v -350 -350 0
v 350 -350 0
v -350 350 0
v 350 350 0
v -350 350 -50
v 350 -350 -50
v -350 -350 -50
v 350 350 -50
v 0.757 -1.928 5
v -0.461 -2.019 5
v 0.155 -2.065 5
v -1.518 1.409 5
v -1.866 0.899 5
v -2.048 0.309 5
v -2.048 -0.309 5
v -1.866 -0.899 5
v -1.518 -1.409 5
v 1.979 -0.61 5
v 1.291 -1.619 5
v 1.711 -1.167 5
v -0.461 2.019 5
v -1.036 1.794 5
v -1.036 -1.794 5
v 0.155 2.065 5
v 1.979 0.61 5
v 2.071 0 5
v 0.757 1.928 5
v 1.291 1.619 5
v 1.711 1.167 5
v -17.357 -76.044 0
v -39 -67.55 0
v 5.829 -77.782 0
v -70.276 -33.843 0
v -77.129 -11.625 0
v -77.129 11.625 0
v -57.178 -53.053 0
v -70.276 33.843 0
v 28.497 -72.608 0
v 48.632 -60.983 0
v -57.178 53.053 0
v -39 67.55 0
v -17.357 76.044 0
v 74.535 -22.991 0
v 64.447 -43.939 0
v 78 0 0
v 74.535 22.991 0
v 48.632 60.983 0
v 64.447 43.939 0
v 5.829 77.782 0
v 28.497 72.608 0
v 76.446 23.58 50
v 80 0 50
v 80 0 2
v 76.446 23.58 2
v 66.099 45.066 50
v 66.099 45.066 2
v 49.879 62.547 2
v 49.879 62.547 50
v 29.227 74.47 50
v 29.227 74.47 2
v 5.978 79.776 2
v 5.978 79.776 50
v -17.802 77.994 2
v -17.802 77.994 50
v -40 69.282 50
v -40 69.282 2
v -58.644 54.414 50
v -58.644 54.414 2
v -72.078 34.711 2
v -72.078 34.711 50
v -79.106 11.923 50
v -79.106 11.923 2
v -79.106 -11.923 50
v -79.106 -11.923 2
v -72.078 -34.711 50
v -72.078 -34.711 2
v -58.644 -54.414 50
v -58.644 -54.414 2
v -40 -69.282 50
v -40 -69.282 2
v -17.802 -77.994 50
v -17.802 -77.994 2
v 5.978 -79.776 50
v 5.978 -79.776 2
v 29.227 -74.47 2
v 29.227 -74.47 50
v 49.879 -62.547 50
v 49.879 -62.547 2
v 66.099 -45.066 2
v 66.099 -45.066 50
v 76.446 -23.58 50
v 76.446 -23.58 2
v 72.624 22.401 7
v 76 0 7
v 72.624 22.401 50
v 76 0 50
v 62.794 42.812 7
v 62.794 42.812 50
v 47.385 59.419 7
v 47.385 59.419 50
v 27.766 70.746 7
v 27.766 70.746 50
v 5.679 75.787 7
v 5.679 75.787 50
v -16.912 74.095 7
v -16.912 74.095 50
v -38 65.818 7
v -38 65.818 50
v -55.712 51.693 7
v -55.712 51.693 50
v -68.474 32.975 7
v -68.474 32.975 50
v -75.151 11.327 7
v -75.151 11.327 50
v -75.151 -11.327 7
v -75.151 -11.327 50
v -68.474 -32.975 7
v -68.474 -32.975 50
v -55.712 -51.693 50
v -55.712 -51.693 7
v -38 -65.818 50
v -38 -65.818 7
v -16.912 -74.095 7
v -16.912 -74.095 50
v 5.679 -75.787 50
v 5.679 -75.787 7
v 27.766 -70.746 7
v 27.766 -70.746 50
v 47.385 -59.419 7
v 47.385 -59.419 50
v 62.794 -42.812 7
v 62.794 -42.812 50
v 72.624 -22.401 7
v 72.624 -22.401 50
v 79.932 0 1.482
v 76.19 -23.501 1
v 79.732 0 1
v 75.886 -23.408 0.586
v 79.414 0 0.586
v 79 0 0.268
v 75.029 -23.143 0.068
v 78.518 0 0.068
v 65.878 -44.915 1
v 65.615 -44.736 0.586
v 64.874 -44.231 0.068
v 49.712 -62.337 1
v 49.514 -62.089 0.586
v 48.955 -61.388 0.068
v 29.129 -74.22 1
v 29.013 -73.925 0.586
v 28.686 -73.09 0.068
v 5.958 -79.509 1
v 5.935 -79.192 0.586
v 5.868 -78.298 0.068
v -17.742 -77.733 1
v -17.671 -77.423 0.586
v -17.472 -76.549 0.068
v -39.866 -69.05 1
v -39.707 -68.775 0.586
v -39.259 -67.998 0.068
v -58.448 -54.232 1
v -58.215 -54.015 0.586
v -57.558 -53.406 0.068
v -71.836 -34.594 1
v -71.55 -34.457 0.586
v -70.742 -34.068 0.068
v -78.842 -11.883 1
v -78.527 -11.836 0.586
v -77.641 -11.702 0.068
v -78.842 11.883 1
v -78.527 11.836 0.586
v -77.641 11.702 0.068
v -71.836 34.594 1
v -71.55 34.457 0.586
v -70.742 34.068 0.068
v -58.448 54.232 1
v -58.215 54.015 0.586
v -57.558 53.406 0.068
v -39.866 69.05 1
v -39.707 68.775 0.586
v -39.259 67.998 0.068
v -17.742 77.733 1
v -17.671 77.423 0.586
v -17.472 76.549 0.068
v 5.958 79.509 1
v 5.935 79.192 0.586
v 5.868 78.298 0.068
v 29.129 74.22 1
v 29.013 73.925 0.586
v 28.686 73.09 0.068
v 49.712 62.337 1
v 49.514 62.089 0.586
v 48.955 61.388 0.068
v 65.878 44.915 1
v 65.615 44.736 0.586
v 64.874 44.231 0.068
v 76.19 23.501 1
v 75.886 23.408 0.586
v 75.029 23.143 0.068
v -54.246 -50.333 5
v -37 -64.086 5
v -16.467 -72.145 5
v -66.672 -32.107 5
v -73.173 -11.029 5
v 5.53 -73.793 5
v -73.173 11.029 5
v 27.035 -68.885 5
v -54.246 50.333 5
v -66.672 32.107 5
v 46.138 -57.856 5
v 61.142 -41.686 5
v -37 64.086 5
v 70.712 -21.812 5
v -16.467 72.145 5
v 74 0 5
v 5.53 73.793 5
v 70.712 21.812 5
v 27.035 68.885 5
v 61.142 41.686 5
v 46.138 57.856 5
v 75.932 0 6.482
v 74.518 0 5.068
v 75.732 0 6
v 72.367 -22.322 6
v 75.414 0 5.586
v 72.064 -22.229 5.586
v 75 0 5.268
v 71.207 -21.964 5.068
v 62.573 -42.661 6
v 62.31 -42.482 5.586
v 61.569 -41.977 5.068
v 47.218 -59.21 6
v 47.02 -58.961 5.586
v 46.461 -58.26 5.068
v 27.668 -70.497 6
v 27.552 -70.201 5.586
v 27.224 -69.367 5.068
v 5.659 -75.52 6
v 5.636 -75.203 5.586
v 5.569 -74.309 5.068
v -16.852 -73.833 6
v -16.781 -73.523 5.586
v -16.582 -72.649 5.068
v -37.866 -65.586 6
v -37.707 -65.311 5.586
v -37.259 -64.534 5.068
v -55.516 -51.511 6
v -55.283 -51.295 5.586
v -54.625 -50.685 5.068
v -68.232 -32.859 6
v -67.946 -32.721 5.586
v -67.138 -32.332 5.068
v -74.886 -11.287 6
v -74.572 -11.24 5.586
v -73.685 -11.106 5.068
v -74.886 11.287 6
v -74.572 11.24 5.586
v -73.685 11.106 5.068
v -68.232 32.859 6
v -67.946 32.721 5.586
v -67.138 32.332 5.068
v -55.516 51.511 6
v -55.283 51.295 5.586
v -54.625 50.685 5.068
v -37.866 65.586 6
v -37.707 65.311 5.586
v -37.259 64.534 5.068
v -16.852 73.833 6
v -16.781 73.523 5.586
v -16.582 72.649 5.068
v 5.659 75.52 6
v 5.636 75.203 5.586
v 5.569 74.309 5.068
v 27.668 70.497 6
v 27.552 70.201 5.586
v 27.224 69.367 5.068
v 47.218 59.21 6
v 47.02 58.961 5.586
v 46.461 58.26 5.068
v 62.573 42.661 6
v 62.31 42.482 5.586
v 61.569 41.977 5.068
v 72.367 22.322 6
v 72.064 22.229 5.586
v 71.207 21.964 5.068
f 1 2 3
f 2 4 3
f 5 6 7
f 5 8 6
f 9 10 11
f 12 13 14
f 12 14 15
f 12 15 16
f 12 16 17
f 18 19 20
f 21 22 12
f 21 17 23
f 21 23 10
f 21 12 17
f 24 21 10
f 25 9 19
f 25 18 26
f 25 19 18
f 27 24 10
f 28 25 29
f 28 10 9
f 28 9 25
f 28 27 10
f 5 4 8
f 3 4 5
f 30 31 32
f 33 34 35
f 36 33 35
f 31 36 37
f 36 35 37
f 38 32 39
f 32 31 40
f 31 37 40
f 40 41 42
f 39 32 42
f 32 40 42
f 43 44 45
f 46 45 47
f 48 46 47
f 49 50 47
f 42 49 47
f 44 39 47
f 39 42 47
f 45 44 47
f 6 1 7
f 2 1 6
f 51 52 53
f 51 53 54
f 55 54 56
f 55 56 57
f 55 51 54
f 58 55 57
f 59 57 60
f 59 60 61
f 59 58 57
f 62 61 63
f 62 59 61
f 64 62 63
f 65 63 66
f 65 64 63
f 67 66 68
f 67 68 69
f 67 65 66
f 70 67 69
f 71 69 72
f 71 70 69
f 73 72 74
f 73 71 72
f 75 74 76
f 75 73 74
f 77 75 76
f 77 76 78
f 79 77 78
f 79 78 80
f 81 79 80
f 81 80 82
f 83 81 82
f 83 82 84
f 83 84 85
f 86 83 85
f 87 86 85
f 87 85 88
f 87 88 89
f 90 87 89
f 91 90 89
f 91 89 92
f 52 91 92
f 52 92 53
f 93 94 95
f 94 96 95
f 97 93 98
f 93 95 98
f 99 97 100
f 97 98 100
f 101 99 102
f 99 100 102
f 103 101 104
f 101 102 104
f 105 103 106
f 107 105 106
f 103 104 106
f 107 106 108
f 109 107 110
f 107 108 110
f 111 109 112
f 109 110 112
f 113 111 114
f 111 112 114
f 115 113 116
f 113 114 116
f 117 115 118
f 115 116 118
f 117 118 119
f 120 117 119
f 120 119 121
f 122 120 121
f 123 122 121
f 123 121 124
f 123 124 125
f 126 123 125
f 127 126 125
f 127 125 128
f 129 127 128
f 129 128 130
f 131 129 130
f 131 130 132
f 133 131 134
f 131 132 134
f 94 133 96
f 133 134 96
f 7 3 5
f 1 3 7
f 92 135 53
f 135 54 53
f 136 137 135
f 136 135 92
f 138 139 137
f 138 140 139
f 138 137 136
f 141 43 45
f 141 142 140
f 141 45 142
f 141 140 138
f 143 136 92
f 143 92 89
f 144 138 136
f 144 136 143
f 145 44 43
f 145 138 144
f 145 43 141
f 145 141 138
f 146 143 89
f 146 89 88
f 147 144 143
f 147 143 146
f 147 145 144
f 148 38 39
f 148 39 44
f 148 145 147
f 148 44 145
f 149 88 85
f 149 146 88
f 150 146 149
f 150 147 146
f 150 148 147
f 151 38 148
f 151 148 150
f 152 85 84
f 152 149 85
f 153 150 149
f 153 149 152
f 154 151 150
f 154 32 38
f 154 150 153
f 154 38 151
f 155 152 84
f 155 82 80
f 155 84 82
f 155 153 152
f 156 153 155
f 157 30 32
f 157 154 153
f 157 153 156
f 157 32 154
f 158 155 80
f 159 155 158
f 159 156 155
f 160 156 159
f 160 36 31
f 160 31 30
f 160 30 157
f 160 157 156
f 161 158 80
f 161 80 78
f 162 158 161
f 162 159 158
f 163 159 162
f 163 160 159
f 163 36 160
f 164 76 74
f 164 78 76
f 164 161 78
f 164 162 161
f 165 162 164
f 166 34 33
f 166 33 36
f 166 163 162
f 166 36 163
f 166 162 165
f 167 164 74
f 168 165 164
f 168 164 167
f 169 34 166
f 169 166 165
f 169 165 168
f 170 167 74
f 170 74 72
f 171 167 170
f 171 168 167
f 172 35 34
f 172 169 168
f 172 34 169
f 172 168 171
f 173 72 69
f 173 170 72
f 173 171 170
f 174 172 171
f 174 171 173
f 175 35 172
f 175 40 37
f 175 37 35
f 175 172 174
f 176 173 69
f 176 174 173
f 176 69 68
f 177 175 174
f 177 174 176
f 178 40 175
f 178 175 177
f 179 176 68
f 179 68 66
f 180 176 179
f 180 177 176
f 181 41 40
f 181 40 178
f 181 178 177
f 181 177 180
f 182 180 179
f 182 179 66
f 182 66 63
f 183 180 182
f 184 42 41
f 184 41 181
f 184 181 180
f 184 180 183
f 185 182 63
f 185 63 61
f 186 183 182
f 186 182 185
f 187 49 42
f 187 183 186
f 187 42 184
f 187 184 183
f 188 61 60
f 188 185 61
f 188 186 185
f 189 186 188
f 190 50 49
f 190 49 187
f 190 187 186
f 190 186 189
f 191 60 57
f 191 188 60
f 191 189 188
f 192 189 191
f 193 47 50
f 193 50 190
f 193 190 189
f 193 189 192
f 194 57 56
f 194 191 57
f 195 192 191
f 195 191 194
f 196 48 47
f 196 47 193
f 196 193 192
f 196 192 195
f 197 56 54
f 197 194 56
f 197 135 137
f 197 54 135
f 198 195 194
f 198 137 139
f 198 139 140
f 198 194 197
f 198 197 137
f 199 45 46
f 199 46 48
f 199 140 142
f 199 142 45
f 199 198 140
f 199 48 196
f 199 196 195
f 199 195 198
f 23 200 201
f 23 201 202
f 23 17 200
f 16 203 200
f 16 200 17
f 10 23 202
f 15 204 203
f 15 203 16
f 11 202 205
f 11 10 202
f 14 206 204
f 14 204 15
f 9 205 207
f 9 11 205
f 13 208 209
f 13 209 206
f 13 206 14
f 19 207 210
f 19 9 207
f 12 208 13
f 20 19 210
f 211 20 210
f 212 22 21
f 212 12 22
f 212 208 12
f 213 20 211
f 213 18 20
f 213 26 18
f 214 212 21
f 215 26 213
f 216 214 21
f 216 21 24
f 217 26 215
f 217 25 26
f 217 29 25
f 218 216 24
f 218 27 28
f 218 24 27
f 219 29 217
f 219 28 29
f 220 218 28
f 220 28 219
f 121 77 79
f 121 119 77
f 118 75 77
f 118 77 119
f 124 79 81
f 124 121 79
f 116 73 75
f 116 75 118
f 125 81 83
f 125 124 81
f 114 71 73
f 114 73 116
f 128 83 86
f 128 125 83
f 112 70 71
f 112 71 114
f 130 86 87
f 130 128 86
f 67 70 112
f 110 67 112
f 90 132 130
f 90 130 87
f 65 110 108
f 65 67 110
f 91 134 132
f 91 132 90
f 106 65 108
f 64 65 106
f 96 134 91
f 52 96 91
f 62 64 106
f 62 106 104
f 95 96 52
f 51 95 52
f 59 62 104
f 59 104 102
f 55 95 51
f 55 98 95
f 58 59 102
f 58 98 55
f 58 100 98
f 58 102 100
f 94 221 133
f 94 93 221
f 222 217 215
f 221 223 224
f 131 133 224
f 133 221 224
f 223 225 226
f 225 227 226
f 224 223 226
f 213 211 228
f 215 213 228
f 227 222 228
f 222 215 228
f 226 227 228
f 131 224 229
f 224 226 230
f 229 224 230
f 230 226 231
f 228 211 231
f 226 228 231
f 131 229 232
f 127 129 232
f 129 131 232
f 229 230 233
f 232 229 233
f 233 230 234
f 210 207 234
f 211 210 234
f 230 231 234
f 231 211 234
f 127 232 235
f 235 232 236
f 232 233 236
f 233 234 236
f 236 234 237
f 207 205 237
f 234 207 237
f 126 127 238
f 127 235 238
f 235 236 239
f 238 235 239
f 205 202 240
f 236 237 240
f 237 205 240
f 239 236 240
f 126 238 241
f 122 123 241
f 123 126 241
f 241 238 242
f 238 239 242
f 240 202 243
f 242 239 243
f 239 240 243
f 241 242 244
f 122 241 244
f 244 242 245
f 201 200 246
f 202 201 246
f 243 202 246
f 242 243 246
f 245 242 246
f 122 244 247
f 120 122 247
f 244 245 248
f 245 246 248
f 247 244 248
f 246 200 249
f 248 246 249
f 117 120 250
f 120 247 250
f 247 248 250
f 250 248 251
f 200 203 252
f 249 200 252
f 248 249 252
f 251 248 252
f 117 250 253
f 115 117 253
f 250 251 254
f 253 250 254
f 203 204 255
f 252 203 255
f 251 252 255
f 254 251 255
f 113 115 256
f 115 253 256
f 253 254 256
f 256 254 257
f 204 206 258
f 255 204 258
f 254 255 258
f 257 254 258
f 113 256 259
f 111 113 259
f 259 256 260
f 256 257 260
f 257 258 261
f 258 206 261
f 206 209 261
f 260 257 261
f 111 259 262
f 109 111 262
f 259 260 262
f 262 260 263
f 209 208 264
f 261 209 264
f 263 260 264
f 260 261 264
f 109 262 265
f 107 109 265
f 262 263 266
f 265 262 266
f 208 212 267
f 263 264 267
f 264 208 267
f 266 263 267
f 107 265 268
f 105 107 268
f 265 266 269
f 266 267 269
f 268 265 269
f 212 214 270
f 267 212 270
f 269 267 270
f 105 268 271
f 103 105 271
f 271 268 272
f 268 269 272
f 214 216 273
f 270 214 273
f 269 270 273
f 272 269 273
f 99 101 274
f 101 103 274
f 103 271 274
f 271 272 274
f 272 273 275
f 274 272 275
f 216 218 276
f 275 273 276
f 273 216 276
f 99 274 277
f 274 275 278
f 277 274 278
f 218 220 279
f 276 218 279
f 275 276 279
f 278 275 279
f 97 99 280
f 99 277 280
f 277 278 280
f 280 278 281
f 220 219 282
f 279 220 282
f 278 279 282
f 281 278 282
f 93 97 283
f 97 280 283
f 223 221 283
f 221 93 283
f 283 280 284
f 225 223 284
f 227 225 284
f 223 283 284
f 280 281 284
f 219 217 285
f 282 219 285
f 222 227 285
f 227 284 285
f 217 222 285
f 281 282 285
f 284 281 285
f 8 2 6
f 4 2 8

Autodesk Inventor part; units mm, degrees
ref_plane "YZ Plane" through (0, 0, 0) normal (1, 0, 0) x (0, 1, 0)
ref_plane "XZ Plane" through (0, 0, 0) normal (0, 1, 0) x (-1, 0, 0)
ref_plane "XY Plane" through (0, 0, 0) normal (0, 0, 1) x (1, 0, 0)
sketch "Эскиз3" plane through (0, 0, 0) normal (0, 1, 0) x (-1, 0, 0)
  line L0 (0, 0) -> (-78, 0)
  arc A0 (-80, 2) -> (-78, 0) centre (-78, 2) ccw
  line L1 (-2.0712, 5) -> (-74, 5)
  arc A1 (-76, 7) -> (-74, 5) centre (-74, 7) ccw
  line L2 (0, 0) -> (0, 5)
  line L3 (0, 5) -> (-2.0712, 5)
  line L4 (0, -10.4971) -> (0, 60.0828) projected
  line L5 (-80, 2) -> (-80, 50)
  line L6 (-76, 7) -> (-76, 50)
  line L7 (-76, 50) -> (-80, 50)
  dimension "d7" = 5
  dimension "d11" = 48
revolve "Вращение1" add sketch "Эскиз3" angle 360 about axis through (0, 0, -10) along (0, 0, 1)
sketch "Эскиз4" plane through (0, 0, 0) normal (0, 0, -1) x (-1, 0, 0)
  point P0 (0, 0)
sketch "Эскиз5" plane through (0, 0, 0) normal (0, 0, -1) x (-1, 0, 0)
  line L0 (350, -350) -> (-350, -350)
  line L1 (-350, -350) -> (-350, 350)
  line L2 (-350, 350) -> (350, 350)
  line L3 (350, 350) -> (350, -350)
  line L4 (350, -350) -> (-350, 350) construction
  line L5 (-350, -350) -> (350, 350) construction
  point P0 (0, 0)
  dimension "d12" = 700
  dimension "d13" = 700
extrude "Выдавливание2" add sketch "Эскиз5" along normal blind 50 separate body
properties part number "крепеж доска+доска"
